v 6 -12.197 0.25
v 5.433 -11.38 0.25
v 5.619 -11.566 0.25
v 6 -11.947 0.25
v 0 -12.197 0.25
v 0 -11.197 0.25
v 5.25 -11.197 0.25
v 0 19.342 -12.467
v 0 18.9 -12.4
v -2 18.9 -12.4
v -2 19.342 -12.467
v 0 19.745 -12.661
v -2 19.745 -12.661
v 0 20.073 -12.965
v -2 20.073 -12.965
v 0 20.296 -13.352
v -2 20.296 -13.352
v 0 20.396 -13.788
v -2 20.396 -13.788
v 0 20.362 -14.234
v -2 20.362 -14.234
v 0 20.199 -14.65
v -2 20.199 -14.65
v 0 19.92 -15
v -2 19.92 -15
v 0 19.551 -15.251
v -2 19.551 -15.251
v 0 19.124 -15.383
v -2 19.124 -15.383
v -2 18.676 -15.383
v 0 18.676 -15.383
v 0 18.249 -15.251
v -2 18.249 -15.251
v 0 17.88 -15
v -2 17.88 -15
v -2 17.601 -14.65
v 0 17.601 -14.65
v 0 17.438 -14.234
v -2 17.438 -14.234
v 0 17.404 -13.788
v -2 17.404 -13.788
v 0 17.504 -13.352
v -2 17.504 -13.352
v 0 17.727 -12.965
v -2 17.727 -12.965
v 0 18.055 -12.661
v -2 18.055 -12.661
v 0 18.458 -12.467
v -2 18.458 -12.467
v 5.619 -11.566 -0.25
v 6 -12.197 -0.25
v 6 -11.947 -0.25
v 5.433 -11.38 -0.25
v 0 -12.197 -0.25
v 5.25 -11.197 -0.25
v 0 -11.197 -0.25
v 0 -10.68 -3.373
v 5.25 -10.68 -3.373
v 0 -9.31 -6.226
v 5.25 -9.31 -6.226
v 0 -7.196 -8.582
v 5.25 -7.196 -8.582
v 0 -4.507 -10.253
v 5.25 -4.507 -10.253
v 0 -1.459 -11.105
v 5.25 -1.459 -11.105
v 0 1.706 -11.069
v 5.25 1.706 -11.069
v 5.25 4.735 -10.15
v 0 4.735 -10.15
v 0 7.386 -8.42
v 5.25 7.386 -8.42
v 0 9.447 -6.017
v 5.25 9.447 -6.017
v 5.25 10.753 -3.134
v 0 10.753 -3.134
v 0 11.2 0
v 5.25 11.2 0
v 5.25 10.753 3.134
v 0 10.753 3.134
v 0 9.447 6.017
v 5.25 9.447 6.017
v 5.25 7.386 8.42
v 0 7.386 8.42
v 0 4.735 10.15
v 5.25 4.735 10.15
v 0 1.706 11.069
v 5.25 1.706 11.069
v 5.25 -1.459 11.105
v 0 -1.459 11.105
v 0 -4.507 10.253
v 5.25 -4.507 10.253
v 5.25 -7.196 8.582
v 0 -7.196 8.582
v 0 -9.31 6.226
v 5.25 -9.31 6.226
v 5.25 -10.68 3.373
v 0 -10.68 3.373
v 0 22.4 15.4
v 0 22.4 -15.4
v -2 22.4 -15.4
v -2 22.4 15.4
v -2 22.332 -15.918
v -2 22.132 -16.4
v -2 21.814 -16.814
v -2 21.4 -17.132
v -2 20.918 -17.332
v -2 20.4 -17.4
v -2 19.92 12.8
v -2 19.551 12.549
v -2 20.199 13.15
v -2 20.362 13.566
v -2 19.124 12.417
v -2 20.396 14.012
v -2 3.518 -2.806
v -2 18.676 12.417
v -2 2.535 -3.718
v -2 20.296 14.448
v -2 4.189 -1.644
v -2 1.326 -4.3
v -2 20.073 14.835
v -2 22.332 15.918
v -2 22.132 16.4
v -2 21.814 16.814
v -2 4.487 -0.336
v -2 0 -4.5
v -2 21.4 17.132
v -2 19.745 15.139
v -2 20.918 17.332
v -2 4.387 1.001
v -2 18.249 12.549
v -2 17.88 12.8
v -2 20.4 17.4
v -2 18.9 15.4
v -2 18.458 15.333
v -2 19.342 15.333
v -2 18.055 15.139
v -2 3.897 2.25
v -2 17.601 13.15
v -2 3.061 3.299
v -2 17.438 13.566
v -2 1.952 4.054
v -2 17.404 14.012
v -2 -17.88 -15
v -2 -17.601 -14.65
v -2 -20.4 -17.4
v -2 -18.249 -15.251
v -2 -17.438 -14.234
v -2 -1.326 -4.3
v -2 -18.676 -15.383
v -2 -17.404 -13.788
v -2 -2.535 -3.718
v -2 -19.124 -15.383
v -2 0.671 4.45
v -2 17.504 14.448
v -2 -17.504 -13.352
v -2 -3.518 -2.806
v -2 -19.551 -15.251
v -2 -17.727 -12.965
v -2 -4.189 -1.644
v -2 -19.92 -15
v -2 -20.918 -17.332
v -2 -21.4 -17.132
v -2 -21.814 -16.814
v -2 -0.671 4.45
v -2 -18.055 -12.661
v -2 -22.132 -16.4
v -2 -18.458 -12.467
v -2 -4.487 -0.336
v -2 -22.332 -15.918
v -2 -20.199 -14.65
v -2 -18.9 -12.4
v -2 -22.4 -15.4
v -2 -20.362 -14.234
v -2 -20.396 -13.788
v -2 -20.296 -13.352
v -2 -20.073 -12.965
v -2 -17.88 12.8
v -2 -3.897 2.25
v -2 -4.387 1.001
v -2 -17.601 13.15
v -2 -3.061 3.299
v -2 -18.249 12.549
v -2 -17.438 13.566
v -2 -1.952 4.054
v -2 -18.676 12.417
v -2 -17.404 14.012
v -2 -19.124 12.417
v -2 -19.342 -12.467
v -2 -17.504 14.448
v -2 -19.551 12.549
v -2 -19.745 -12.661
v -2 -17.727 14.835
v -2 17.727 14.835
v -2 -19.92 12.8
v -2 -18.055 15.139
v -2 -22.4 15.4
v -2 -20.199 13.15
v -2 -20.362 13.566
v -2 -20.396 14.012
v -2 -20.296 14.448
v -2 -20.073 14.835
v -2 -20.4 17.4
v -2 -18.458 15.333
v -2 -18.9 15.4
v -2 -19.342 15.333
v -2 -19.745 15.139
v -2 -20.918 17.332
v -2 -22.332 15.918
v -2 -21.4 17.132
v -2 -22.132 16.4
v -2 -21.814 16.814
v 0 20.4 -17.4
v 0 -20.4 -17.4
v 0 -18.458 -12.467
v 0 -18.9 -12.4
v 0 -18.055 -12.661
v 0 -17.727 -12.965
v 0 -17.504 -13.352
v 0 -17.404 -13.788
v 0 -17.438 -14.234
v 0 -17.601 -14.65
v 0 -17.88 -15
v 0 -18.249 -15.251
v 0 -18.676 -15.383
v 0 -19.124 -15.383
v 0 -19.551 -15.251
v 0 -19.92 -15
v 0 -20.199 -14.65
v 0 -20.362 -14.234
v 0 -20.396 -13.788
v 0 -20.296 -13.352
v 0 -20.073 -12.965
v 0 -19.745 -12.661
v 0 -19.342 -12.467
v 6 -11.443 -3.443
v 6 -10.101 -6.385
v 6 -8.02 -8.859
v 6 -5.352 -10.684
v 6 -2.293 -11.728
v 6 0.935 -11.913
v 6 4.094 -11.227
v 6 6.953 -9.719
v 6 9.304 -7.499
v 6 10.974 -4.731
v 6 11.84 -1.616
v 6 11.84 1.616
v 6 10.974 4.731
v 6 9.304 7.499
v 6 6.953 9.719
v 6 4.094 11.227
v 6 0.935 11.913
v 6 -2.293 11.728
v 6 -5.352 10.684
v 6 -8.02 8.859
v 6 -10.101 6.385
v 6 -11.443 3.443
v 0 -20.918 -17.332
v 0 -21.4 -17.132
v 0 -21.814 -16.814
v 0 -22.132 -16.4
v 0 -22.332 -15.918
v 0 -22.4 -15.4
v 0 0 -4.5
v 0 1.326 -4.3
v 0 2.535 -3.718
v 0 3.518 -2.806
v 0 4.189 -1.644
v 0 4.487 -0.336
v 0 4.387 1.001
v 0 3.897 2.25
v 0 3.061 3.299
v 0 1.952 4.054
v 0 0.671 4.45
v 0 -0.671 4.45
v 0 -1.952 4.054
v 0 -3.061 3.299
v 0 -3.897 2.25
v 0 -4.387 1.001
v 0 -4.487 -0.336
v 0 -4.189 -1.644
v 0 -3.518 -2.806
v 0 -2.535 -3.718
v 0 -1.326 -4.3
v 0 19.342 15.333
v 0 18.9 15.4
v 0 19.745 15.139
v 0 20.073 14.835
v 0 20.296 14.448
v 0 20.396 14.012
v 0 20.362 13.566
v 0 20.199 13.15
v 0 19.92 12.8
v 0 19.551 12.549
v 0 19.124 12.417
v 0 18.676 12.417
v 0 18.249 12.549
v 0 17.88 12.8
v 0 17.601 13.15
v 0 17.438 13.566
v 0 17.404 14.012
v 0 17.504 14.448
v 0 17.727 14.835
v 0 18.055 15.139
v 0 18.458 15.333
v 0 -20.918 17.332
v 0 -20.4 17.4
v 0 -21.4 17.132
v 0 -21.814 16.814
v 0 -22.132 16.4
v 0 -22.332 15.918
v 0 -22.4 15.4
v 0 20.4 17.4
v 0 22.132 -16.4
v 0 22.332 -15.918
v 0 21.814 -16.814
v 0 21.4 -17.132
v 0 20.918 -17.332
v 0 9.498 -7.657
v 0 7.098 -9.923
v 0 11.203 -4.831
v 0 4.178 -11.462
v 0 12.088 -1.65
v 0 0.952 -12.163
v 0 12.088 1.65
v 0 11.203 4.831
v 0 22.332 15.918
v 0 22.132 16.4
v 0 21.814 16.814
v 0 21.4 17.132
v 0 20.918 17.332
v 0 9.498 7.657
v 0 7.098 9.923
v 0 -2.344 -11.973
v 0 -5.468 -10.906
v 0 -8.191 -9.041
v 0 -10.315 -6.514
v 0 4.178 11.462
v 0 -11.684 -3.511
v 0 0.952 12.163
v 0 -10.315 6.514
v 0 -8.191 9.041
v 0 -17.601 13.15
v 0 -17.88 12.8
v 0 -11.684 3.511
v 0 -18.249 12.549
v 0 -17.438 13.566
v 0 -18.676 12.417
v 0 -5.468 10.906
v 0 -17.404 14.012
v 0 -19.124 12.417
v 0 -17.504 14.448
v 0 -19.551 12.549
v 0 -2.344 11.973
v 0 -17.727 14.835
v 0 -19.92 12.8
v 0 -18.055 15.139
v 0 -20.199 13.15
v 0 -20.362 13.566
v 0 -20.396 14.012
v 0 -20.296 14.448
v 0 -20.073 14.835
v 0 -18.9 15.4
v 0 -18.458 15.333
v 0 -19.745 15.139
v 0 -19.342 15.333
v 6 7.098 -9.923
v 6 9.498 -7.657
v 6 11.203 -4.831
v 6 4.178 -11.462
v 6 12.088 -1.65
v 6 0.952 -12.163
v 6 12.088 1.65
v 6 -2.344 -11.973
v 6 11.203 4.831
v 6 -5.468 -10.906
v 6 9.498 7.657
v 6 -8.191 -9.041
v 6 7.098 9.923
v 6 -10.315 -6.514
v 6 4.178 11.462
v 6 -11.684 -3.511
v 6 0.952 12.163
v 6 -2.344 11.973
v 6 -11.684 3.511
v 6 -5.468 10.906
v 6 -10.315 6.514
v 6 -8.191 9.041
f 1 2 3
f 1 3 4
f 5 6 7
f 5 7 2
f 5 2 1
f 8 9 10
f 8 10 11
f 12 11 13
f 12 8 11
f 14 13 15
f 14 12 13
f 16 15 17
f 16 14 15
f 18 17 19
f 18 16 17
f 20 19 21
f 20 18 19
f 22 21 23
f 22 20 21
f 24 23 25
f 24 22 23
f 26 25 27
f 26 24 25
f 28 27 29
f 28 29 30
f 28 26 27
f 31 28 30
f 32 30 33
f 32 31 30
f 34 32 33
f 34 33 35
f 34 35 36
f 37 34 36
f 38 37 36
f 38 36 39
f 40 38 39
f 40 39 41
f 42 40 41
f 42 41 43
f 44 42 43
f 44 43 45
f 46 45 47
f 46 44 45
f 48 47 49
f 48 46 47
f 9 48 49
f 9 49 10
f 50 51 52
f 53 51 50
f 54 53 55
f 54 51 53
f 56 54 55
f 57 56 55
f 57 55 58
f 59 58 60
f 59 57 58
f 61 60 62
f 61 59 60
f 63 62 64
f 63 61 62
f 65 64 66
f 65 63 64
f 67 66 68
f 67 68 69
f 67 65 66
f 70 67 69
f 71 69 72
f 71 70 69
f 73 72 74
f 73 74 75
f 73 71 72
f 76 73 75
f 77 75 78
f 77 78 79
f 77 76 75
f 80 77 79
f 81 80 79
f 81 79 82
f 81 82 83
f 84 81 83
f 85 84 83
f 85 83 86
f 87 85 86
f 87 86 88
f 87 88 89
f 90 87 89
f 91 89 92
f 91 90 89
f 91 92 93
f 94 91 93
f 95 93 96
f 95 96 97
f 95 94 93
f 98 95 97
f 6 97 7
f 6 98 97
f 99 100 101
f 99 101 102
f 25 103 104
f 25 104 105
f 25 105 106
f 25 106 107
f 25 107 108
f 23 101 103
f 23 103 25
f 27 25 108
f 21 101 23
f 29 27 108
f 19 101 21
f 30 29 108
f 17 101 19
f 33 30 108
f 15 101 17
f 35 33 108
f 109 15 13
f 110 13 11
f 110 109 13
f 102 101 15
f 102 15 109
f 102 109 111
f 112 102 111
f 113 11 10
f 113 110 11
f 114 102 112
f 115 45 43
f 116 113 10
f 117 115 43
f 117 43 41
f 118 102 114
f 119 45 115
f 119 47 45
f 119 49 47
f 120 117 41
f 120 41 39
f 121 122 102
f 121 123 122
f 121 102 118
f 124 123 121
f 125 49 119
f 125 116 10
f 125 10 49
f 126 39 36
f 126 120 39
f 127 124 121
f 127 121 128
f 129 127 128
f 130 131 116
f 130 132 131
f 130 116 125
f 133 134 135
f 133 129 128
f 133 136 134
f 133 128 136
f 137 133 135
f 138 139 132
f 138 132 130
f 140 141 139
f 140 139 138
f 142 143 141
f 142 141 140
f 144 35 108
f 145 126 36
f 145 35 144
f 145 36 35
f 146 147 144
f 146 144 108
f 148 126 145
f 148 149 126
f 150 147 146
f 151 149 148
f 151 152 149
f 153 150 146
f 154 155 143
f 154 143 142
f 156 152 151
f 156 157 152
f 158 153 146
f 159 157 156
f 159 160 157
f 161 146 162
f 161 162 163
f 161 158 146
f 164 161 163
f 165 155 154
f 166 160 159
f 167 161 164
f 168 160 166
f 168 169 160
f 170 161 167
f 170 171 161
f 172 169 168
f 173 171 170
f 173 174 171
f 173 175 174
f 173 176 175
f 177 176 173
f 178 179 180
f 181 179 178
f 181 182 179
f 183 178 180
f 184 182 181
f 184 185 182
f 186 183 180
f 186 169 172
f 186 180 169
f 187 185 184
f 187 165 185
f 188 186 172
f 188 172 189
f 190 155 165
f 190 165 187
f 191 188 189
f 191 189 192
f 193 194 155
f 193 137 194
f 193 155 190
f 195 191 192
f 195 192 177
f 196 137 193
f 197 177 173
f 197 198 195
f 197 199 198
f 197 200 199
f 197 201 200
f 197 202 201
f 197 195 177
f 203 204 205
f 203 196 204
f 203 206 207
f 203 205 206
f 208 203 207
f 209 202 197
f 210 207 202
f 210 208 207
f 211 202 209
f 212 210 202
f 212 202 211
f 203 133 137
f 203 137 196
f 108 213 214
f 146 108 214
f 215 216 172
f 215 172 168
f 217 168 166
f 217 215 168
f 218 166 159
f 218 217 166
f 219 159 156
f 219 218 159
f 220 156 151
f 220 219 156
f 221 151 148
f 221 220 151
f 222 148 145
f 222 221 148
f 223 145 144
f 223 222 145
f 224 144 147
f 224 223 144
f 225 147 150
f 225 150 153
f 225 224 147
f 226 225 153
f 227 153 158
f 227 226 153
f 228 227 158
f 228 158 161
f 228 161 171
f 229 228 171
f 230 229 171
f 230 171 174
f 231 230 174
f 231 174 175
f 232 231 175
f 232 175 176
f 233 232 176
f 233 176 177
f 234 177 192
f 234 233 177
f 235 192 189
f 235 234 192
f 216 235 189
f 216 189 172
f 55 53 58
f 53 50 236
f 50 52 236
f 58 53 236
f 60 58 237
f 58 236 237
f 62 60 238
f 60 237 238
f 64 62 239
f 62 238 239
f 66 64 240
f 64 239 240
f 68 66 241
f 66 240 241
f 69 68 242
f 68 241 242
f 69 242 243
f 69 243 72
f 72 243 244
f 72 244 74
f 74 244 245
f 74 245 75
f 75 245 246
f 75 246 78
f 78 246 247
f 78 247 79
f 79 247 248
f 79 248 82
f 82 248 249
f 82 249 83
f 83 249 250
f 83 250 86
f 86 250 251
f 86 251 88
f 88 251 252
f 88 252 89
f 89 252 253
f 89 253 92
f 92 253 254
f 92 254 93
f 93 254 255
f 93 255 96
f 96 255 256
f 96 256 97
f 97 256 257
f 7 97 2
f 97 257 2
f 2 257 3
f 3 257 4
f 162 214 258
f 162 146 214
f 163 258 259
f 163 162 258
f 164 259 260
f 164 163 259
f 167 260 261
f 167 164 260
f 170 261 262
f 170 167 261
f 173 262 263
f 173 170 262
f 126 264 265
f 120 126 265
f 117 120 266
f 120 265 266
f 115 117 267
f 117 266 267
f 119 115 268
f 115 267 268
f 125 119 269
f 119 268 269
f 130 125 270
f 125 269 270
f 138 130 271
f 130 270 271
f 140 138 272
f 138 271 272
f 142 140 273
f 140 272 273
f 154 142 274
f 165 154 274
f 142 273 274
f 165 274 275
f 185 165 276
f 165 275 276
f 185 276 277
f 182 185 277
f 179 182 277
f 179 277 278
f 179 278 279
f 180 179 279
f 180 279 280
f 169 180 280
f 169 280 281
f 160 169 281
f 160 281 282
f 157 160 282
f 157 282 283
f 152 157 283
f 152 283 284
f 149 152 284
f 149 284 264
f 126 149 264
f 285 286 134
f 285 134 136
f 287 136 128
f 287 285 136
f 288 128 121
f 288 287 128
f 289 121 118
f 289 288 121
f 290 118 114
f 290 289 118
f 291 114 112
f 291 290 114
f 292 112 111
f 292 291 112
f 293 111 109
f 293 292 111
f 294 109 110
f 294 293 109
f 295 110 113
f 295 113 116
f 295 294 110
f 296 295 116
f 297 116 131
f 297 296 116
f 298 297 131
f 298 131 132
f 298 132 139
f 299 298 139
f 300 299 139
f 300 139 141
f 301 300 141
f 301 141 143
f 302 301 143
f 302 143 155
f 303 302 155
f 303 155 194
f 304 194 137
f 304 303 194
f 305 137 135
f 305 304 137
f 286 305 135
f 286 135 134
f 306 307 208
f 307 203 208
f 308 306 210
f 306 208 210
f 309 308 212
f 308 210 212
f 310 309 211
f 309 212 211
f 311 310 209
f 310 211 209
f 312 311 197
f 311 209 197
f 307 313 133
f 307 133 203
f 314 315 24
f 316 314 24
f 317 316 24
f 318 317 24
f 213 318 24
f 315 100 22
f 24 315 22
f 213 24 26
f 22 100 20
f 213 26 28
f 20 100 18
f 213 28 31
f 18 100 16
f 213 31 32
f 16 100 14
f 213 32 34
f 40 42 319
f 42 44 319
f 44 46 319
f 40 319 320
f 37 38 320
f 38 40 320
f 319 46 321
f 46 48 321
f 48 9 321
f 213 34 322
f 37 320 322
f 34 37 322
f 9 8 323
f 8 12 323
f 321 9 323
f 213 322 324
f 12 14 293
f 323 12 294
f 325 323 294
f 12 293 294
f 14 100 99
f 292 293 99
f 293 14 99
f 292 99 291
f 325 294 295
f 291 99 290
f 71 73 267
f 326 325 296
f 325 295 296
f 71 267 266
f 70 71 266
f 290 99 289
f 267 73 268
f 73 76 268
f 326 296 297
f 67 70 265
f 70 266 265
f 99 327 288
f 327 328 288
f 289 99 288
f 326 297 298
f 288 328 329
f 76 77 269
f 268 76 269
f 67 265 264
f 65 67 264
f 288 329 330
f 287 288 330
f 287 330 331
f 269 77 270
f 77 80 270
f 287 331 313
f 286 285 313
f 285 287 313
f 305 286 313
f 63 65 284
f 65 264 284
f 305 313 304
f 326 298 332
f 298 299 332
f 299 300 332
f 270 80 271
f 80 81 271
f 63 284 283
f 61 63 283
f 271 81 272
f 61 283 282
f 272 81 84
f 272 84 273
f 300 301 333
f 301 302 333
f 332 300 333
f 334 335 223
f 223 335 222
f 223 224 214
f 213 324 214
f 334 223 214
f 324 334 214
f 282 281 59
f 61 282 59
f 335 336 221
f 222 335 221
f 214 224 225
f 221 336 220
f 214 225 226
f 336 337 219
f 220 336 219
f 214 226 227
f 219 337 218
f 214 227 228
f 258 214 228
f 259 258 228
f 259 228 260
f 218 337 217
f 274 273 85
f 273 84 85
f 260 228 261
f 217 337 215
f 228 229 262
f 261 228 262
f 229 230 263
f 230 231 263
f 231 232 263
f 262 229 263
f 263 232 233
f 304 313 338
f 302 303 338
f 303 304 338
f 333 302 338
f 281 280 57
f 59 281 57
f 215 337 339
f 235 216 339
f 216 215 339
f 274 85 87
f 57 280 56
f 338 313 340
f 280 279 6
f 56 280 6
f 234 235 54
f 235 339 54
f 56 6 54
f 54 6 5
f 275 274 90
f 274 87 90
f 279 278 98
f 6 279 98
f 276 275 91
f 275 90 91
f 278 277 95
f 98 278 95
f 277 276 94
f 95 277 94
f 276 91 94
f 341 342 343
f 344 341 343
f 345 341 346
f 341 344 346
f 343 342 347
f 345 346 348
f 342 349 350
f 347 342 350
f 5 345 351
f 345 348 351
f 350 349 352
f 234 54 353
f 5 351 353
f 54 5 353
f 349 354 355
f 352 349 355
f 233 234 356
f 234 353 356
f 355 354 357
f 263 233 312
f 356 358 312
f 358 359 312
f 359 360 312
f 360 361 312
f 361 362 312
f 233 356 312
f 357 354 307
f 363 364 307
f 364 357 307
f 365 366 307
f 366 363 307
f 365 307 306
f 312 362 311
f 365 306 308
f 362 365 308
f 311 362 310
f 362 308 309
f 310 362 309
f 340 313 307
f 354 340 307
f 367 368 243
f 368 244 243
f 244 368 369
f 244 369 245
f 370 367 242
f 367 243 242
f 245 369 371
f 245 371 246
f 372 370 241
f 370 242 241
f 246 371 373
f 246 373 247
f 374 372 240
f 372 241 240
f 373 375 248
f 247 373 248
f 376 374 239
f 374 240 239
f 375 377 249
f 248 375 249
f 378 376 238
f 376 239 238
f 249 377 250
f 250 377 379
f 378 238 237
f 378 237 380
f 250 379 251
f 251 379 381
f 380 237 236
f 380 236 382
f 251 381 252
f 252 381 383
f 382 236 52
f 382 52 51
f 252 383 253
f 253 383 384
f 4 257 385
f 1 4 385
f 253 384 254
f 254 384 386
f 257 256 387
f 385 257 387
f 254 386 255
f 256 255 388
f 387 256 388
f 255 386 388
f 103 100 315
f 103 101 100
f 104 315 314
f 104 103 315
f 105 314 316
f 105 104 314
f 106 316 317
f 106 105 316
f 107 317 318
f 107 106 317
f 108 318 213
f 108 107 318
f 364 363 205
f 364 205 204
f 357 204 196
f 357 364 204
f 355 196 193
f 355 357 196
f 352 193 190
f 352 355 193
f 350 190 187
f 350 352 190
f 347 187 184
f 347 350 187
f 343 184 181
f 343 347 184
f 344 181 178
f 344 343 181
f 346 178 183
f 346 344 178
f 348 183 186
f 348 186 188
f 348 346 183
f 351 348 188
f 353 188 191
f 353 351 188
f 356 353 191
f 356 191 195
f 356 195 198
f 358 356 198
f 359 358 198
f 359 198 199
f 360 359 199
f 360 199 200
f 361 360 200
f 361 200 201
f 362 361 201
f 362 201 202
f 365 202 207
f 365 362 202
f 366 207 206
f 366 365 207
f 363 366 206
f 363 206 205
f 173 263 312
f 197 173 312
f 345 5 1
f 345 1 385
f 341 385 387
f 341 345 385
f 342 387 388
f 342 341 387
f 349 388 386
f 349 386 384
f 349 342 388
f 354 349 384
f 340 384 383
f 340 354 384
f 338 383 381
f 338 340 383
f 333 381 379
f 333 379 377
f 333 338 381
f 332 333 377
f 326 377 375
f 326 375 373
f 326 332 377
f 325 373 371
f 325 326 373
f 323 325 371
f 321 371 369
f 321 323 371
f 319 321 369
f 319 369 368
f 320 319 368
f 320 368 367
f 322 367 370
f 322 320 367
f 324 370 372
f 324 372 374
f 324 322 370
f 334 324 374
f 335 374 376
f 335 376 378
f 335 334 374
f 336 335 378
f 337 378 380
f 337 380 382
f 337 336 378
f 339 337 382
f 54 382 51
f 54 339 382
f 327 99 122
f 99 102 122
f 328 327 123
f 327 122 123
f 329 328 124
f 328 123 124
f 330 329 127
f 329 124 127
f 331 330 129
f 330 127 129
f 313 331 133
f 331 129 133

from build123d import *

# Parameters (mm, degrees)
BOSS_EXTRUDE1_DEPTH = 6
SKETCH4_W           = 44.8
SKETCH4_H           = 34.8
SKETCH4_R           = 1.5
BOSS_EXTRUDE3_DEPTH = 2
FILLET1_R           = 2
CHAMFER1_SIZE       = 0.75
SKETCH5_R           = 4.5
CUT_EXTRUDE1_DEPTH  = 29.991722957


with BuildPart() as part:
    # Sketch1 → Boss-Extrude1 (new body)
    with BuildSketch(Plane.YZ):
        with BuildLine():
            Line((-12.197438256, -0.25), (-11.197209474, -0.25))
            ThreePointArc((-11.197209474, -0.25), (11.2, 0), (-11.197209474, 0.25))
            Line((-11.197209474, 0.25), (-12.197438256, 0.25))
            ThreePointArc((-12.197438256, 0.25), (12.2, 0), (-12.197438256, -0.25))
        make_face()
    extrude(amount=BOSS_EXTRUDE1_DEPTH)

    # Sketch4 → Boss-Extrude3 (add)
    with BuildSketch(Plane(origin=(0, 0, 0), x_dir=(0, -1, 0), z_dir=(-1, 0, 0))):
        Rectangle(SKETCH4_W, SKETCH4_H)
        with Locations(Location((-18.9, 13.9, 0), (0, 0, 90))):
            Circle(SKETCH4_R, mode=Mode.SUBTRACT)
        with Locations(Location((18.9, 13.9, 0), (0, 0, 90))):
            Circle(SKETCH4_R, mode=Mode.SUBTRACT)
        with Locations(Location((-18.9, -13.9, 0), (0, 0, 90))):
            Circle(SKETCH4_R, mode=Mode.SUBTRACT)
        with Locations(Location((18.9, -13.9, 0), (0, 0, 90))):
            Circle(SKETCH4_R, mode=Mode.SUBTRACT)
    extrude(amount=BOSS_EXTRUDE3_DEPTH)

    # Fillet1
    fillet1_edges = [part.edges().sort_by_distance(p)[0] for p in [
        (-1, -22.4, 17.4),
        (-1, 22.4, 17.4),
        (-1, 22.4, -17.4),
        (-1, -22.4, -17.4),
    ]]
    fillet(fillet1_edges, radius=FILLET1_R)

    # Chamfer1
    chamfer1_edges = [part.edges().sort_by_distance(p)[0] for p in [
        (6, 11.2, 0),
    ]]
    chamfer(chamfer1_edges, length=CHAMFER1_SIZE)

    # Sketch5 → Cut-Extrude1 (cut, through all)
    with BuildSketch(Plane.YZ):
        with Locations(Location((0, 0, 0), (0, 0, 270))):
            Circle(SKETCH5_R)
    extrude(amount=-CUT_EXTRUDE1_DEPTH, mode=Mode.SUBTRACT)


solid = part.part
